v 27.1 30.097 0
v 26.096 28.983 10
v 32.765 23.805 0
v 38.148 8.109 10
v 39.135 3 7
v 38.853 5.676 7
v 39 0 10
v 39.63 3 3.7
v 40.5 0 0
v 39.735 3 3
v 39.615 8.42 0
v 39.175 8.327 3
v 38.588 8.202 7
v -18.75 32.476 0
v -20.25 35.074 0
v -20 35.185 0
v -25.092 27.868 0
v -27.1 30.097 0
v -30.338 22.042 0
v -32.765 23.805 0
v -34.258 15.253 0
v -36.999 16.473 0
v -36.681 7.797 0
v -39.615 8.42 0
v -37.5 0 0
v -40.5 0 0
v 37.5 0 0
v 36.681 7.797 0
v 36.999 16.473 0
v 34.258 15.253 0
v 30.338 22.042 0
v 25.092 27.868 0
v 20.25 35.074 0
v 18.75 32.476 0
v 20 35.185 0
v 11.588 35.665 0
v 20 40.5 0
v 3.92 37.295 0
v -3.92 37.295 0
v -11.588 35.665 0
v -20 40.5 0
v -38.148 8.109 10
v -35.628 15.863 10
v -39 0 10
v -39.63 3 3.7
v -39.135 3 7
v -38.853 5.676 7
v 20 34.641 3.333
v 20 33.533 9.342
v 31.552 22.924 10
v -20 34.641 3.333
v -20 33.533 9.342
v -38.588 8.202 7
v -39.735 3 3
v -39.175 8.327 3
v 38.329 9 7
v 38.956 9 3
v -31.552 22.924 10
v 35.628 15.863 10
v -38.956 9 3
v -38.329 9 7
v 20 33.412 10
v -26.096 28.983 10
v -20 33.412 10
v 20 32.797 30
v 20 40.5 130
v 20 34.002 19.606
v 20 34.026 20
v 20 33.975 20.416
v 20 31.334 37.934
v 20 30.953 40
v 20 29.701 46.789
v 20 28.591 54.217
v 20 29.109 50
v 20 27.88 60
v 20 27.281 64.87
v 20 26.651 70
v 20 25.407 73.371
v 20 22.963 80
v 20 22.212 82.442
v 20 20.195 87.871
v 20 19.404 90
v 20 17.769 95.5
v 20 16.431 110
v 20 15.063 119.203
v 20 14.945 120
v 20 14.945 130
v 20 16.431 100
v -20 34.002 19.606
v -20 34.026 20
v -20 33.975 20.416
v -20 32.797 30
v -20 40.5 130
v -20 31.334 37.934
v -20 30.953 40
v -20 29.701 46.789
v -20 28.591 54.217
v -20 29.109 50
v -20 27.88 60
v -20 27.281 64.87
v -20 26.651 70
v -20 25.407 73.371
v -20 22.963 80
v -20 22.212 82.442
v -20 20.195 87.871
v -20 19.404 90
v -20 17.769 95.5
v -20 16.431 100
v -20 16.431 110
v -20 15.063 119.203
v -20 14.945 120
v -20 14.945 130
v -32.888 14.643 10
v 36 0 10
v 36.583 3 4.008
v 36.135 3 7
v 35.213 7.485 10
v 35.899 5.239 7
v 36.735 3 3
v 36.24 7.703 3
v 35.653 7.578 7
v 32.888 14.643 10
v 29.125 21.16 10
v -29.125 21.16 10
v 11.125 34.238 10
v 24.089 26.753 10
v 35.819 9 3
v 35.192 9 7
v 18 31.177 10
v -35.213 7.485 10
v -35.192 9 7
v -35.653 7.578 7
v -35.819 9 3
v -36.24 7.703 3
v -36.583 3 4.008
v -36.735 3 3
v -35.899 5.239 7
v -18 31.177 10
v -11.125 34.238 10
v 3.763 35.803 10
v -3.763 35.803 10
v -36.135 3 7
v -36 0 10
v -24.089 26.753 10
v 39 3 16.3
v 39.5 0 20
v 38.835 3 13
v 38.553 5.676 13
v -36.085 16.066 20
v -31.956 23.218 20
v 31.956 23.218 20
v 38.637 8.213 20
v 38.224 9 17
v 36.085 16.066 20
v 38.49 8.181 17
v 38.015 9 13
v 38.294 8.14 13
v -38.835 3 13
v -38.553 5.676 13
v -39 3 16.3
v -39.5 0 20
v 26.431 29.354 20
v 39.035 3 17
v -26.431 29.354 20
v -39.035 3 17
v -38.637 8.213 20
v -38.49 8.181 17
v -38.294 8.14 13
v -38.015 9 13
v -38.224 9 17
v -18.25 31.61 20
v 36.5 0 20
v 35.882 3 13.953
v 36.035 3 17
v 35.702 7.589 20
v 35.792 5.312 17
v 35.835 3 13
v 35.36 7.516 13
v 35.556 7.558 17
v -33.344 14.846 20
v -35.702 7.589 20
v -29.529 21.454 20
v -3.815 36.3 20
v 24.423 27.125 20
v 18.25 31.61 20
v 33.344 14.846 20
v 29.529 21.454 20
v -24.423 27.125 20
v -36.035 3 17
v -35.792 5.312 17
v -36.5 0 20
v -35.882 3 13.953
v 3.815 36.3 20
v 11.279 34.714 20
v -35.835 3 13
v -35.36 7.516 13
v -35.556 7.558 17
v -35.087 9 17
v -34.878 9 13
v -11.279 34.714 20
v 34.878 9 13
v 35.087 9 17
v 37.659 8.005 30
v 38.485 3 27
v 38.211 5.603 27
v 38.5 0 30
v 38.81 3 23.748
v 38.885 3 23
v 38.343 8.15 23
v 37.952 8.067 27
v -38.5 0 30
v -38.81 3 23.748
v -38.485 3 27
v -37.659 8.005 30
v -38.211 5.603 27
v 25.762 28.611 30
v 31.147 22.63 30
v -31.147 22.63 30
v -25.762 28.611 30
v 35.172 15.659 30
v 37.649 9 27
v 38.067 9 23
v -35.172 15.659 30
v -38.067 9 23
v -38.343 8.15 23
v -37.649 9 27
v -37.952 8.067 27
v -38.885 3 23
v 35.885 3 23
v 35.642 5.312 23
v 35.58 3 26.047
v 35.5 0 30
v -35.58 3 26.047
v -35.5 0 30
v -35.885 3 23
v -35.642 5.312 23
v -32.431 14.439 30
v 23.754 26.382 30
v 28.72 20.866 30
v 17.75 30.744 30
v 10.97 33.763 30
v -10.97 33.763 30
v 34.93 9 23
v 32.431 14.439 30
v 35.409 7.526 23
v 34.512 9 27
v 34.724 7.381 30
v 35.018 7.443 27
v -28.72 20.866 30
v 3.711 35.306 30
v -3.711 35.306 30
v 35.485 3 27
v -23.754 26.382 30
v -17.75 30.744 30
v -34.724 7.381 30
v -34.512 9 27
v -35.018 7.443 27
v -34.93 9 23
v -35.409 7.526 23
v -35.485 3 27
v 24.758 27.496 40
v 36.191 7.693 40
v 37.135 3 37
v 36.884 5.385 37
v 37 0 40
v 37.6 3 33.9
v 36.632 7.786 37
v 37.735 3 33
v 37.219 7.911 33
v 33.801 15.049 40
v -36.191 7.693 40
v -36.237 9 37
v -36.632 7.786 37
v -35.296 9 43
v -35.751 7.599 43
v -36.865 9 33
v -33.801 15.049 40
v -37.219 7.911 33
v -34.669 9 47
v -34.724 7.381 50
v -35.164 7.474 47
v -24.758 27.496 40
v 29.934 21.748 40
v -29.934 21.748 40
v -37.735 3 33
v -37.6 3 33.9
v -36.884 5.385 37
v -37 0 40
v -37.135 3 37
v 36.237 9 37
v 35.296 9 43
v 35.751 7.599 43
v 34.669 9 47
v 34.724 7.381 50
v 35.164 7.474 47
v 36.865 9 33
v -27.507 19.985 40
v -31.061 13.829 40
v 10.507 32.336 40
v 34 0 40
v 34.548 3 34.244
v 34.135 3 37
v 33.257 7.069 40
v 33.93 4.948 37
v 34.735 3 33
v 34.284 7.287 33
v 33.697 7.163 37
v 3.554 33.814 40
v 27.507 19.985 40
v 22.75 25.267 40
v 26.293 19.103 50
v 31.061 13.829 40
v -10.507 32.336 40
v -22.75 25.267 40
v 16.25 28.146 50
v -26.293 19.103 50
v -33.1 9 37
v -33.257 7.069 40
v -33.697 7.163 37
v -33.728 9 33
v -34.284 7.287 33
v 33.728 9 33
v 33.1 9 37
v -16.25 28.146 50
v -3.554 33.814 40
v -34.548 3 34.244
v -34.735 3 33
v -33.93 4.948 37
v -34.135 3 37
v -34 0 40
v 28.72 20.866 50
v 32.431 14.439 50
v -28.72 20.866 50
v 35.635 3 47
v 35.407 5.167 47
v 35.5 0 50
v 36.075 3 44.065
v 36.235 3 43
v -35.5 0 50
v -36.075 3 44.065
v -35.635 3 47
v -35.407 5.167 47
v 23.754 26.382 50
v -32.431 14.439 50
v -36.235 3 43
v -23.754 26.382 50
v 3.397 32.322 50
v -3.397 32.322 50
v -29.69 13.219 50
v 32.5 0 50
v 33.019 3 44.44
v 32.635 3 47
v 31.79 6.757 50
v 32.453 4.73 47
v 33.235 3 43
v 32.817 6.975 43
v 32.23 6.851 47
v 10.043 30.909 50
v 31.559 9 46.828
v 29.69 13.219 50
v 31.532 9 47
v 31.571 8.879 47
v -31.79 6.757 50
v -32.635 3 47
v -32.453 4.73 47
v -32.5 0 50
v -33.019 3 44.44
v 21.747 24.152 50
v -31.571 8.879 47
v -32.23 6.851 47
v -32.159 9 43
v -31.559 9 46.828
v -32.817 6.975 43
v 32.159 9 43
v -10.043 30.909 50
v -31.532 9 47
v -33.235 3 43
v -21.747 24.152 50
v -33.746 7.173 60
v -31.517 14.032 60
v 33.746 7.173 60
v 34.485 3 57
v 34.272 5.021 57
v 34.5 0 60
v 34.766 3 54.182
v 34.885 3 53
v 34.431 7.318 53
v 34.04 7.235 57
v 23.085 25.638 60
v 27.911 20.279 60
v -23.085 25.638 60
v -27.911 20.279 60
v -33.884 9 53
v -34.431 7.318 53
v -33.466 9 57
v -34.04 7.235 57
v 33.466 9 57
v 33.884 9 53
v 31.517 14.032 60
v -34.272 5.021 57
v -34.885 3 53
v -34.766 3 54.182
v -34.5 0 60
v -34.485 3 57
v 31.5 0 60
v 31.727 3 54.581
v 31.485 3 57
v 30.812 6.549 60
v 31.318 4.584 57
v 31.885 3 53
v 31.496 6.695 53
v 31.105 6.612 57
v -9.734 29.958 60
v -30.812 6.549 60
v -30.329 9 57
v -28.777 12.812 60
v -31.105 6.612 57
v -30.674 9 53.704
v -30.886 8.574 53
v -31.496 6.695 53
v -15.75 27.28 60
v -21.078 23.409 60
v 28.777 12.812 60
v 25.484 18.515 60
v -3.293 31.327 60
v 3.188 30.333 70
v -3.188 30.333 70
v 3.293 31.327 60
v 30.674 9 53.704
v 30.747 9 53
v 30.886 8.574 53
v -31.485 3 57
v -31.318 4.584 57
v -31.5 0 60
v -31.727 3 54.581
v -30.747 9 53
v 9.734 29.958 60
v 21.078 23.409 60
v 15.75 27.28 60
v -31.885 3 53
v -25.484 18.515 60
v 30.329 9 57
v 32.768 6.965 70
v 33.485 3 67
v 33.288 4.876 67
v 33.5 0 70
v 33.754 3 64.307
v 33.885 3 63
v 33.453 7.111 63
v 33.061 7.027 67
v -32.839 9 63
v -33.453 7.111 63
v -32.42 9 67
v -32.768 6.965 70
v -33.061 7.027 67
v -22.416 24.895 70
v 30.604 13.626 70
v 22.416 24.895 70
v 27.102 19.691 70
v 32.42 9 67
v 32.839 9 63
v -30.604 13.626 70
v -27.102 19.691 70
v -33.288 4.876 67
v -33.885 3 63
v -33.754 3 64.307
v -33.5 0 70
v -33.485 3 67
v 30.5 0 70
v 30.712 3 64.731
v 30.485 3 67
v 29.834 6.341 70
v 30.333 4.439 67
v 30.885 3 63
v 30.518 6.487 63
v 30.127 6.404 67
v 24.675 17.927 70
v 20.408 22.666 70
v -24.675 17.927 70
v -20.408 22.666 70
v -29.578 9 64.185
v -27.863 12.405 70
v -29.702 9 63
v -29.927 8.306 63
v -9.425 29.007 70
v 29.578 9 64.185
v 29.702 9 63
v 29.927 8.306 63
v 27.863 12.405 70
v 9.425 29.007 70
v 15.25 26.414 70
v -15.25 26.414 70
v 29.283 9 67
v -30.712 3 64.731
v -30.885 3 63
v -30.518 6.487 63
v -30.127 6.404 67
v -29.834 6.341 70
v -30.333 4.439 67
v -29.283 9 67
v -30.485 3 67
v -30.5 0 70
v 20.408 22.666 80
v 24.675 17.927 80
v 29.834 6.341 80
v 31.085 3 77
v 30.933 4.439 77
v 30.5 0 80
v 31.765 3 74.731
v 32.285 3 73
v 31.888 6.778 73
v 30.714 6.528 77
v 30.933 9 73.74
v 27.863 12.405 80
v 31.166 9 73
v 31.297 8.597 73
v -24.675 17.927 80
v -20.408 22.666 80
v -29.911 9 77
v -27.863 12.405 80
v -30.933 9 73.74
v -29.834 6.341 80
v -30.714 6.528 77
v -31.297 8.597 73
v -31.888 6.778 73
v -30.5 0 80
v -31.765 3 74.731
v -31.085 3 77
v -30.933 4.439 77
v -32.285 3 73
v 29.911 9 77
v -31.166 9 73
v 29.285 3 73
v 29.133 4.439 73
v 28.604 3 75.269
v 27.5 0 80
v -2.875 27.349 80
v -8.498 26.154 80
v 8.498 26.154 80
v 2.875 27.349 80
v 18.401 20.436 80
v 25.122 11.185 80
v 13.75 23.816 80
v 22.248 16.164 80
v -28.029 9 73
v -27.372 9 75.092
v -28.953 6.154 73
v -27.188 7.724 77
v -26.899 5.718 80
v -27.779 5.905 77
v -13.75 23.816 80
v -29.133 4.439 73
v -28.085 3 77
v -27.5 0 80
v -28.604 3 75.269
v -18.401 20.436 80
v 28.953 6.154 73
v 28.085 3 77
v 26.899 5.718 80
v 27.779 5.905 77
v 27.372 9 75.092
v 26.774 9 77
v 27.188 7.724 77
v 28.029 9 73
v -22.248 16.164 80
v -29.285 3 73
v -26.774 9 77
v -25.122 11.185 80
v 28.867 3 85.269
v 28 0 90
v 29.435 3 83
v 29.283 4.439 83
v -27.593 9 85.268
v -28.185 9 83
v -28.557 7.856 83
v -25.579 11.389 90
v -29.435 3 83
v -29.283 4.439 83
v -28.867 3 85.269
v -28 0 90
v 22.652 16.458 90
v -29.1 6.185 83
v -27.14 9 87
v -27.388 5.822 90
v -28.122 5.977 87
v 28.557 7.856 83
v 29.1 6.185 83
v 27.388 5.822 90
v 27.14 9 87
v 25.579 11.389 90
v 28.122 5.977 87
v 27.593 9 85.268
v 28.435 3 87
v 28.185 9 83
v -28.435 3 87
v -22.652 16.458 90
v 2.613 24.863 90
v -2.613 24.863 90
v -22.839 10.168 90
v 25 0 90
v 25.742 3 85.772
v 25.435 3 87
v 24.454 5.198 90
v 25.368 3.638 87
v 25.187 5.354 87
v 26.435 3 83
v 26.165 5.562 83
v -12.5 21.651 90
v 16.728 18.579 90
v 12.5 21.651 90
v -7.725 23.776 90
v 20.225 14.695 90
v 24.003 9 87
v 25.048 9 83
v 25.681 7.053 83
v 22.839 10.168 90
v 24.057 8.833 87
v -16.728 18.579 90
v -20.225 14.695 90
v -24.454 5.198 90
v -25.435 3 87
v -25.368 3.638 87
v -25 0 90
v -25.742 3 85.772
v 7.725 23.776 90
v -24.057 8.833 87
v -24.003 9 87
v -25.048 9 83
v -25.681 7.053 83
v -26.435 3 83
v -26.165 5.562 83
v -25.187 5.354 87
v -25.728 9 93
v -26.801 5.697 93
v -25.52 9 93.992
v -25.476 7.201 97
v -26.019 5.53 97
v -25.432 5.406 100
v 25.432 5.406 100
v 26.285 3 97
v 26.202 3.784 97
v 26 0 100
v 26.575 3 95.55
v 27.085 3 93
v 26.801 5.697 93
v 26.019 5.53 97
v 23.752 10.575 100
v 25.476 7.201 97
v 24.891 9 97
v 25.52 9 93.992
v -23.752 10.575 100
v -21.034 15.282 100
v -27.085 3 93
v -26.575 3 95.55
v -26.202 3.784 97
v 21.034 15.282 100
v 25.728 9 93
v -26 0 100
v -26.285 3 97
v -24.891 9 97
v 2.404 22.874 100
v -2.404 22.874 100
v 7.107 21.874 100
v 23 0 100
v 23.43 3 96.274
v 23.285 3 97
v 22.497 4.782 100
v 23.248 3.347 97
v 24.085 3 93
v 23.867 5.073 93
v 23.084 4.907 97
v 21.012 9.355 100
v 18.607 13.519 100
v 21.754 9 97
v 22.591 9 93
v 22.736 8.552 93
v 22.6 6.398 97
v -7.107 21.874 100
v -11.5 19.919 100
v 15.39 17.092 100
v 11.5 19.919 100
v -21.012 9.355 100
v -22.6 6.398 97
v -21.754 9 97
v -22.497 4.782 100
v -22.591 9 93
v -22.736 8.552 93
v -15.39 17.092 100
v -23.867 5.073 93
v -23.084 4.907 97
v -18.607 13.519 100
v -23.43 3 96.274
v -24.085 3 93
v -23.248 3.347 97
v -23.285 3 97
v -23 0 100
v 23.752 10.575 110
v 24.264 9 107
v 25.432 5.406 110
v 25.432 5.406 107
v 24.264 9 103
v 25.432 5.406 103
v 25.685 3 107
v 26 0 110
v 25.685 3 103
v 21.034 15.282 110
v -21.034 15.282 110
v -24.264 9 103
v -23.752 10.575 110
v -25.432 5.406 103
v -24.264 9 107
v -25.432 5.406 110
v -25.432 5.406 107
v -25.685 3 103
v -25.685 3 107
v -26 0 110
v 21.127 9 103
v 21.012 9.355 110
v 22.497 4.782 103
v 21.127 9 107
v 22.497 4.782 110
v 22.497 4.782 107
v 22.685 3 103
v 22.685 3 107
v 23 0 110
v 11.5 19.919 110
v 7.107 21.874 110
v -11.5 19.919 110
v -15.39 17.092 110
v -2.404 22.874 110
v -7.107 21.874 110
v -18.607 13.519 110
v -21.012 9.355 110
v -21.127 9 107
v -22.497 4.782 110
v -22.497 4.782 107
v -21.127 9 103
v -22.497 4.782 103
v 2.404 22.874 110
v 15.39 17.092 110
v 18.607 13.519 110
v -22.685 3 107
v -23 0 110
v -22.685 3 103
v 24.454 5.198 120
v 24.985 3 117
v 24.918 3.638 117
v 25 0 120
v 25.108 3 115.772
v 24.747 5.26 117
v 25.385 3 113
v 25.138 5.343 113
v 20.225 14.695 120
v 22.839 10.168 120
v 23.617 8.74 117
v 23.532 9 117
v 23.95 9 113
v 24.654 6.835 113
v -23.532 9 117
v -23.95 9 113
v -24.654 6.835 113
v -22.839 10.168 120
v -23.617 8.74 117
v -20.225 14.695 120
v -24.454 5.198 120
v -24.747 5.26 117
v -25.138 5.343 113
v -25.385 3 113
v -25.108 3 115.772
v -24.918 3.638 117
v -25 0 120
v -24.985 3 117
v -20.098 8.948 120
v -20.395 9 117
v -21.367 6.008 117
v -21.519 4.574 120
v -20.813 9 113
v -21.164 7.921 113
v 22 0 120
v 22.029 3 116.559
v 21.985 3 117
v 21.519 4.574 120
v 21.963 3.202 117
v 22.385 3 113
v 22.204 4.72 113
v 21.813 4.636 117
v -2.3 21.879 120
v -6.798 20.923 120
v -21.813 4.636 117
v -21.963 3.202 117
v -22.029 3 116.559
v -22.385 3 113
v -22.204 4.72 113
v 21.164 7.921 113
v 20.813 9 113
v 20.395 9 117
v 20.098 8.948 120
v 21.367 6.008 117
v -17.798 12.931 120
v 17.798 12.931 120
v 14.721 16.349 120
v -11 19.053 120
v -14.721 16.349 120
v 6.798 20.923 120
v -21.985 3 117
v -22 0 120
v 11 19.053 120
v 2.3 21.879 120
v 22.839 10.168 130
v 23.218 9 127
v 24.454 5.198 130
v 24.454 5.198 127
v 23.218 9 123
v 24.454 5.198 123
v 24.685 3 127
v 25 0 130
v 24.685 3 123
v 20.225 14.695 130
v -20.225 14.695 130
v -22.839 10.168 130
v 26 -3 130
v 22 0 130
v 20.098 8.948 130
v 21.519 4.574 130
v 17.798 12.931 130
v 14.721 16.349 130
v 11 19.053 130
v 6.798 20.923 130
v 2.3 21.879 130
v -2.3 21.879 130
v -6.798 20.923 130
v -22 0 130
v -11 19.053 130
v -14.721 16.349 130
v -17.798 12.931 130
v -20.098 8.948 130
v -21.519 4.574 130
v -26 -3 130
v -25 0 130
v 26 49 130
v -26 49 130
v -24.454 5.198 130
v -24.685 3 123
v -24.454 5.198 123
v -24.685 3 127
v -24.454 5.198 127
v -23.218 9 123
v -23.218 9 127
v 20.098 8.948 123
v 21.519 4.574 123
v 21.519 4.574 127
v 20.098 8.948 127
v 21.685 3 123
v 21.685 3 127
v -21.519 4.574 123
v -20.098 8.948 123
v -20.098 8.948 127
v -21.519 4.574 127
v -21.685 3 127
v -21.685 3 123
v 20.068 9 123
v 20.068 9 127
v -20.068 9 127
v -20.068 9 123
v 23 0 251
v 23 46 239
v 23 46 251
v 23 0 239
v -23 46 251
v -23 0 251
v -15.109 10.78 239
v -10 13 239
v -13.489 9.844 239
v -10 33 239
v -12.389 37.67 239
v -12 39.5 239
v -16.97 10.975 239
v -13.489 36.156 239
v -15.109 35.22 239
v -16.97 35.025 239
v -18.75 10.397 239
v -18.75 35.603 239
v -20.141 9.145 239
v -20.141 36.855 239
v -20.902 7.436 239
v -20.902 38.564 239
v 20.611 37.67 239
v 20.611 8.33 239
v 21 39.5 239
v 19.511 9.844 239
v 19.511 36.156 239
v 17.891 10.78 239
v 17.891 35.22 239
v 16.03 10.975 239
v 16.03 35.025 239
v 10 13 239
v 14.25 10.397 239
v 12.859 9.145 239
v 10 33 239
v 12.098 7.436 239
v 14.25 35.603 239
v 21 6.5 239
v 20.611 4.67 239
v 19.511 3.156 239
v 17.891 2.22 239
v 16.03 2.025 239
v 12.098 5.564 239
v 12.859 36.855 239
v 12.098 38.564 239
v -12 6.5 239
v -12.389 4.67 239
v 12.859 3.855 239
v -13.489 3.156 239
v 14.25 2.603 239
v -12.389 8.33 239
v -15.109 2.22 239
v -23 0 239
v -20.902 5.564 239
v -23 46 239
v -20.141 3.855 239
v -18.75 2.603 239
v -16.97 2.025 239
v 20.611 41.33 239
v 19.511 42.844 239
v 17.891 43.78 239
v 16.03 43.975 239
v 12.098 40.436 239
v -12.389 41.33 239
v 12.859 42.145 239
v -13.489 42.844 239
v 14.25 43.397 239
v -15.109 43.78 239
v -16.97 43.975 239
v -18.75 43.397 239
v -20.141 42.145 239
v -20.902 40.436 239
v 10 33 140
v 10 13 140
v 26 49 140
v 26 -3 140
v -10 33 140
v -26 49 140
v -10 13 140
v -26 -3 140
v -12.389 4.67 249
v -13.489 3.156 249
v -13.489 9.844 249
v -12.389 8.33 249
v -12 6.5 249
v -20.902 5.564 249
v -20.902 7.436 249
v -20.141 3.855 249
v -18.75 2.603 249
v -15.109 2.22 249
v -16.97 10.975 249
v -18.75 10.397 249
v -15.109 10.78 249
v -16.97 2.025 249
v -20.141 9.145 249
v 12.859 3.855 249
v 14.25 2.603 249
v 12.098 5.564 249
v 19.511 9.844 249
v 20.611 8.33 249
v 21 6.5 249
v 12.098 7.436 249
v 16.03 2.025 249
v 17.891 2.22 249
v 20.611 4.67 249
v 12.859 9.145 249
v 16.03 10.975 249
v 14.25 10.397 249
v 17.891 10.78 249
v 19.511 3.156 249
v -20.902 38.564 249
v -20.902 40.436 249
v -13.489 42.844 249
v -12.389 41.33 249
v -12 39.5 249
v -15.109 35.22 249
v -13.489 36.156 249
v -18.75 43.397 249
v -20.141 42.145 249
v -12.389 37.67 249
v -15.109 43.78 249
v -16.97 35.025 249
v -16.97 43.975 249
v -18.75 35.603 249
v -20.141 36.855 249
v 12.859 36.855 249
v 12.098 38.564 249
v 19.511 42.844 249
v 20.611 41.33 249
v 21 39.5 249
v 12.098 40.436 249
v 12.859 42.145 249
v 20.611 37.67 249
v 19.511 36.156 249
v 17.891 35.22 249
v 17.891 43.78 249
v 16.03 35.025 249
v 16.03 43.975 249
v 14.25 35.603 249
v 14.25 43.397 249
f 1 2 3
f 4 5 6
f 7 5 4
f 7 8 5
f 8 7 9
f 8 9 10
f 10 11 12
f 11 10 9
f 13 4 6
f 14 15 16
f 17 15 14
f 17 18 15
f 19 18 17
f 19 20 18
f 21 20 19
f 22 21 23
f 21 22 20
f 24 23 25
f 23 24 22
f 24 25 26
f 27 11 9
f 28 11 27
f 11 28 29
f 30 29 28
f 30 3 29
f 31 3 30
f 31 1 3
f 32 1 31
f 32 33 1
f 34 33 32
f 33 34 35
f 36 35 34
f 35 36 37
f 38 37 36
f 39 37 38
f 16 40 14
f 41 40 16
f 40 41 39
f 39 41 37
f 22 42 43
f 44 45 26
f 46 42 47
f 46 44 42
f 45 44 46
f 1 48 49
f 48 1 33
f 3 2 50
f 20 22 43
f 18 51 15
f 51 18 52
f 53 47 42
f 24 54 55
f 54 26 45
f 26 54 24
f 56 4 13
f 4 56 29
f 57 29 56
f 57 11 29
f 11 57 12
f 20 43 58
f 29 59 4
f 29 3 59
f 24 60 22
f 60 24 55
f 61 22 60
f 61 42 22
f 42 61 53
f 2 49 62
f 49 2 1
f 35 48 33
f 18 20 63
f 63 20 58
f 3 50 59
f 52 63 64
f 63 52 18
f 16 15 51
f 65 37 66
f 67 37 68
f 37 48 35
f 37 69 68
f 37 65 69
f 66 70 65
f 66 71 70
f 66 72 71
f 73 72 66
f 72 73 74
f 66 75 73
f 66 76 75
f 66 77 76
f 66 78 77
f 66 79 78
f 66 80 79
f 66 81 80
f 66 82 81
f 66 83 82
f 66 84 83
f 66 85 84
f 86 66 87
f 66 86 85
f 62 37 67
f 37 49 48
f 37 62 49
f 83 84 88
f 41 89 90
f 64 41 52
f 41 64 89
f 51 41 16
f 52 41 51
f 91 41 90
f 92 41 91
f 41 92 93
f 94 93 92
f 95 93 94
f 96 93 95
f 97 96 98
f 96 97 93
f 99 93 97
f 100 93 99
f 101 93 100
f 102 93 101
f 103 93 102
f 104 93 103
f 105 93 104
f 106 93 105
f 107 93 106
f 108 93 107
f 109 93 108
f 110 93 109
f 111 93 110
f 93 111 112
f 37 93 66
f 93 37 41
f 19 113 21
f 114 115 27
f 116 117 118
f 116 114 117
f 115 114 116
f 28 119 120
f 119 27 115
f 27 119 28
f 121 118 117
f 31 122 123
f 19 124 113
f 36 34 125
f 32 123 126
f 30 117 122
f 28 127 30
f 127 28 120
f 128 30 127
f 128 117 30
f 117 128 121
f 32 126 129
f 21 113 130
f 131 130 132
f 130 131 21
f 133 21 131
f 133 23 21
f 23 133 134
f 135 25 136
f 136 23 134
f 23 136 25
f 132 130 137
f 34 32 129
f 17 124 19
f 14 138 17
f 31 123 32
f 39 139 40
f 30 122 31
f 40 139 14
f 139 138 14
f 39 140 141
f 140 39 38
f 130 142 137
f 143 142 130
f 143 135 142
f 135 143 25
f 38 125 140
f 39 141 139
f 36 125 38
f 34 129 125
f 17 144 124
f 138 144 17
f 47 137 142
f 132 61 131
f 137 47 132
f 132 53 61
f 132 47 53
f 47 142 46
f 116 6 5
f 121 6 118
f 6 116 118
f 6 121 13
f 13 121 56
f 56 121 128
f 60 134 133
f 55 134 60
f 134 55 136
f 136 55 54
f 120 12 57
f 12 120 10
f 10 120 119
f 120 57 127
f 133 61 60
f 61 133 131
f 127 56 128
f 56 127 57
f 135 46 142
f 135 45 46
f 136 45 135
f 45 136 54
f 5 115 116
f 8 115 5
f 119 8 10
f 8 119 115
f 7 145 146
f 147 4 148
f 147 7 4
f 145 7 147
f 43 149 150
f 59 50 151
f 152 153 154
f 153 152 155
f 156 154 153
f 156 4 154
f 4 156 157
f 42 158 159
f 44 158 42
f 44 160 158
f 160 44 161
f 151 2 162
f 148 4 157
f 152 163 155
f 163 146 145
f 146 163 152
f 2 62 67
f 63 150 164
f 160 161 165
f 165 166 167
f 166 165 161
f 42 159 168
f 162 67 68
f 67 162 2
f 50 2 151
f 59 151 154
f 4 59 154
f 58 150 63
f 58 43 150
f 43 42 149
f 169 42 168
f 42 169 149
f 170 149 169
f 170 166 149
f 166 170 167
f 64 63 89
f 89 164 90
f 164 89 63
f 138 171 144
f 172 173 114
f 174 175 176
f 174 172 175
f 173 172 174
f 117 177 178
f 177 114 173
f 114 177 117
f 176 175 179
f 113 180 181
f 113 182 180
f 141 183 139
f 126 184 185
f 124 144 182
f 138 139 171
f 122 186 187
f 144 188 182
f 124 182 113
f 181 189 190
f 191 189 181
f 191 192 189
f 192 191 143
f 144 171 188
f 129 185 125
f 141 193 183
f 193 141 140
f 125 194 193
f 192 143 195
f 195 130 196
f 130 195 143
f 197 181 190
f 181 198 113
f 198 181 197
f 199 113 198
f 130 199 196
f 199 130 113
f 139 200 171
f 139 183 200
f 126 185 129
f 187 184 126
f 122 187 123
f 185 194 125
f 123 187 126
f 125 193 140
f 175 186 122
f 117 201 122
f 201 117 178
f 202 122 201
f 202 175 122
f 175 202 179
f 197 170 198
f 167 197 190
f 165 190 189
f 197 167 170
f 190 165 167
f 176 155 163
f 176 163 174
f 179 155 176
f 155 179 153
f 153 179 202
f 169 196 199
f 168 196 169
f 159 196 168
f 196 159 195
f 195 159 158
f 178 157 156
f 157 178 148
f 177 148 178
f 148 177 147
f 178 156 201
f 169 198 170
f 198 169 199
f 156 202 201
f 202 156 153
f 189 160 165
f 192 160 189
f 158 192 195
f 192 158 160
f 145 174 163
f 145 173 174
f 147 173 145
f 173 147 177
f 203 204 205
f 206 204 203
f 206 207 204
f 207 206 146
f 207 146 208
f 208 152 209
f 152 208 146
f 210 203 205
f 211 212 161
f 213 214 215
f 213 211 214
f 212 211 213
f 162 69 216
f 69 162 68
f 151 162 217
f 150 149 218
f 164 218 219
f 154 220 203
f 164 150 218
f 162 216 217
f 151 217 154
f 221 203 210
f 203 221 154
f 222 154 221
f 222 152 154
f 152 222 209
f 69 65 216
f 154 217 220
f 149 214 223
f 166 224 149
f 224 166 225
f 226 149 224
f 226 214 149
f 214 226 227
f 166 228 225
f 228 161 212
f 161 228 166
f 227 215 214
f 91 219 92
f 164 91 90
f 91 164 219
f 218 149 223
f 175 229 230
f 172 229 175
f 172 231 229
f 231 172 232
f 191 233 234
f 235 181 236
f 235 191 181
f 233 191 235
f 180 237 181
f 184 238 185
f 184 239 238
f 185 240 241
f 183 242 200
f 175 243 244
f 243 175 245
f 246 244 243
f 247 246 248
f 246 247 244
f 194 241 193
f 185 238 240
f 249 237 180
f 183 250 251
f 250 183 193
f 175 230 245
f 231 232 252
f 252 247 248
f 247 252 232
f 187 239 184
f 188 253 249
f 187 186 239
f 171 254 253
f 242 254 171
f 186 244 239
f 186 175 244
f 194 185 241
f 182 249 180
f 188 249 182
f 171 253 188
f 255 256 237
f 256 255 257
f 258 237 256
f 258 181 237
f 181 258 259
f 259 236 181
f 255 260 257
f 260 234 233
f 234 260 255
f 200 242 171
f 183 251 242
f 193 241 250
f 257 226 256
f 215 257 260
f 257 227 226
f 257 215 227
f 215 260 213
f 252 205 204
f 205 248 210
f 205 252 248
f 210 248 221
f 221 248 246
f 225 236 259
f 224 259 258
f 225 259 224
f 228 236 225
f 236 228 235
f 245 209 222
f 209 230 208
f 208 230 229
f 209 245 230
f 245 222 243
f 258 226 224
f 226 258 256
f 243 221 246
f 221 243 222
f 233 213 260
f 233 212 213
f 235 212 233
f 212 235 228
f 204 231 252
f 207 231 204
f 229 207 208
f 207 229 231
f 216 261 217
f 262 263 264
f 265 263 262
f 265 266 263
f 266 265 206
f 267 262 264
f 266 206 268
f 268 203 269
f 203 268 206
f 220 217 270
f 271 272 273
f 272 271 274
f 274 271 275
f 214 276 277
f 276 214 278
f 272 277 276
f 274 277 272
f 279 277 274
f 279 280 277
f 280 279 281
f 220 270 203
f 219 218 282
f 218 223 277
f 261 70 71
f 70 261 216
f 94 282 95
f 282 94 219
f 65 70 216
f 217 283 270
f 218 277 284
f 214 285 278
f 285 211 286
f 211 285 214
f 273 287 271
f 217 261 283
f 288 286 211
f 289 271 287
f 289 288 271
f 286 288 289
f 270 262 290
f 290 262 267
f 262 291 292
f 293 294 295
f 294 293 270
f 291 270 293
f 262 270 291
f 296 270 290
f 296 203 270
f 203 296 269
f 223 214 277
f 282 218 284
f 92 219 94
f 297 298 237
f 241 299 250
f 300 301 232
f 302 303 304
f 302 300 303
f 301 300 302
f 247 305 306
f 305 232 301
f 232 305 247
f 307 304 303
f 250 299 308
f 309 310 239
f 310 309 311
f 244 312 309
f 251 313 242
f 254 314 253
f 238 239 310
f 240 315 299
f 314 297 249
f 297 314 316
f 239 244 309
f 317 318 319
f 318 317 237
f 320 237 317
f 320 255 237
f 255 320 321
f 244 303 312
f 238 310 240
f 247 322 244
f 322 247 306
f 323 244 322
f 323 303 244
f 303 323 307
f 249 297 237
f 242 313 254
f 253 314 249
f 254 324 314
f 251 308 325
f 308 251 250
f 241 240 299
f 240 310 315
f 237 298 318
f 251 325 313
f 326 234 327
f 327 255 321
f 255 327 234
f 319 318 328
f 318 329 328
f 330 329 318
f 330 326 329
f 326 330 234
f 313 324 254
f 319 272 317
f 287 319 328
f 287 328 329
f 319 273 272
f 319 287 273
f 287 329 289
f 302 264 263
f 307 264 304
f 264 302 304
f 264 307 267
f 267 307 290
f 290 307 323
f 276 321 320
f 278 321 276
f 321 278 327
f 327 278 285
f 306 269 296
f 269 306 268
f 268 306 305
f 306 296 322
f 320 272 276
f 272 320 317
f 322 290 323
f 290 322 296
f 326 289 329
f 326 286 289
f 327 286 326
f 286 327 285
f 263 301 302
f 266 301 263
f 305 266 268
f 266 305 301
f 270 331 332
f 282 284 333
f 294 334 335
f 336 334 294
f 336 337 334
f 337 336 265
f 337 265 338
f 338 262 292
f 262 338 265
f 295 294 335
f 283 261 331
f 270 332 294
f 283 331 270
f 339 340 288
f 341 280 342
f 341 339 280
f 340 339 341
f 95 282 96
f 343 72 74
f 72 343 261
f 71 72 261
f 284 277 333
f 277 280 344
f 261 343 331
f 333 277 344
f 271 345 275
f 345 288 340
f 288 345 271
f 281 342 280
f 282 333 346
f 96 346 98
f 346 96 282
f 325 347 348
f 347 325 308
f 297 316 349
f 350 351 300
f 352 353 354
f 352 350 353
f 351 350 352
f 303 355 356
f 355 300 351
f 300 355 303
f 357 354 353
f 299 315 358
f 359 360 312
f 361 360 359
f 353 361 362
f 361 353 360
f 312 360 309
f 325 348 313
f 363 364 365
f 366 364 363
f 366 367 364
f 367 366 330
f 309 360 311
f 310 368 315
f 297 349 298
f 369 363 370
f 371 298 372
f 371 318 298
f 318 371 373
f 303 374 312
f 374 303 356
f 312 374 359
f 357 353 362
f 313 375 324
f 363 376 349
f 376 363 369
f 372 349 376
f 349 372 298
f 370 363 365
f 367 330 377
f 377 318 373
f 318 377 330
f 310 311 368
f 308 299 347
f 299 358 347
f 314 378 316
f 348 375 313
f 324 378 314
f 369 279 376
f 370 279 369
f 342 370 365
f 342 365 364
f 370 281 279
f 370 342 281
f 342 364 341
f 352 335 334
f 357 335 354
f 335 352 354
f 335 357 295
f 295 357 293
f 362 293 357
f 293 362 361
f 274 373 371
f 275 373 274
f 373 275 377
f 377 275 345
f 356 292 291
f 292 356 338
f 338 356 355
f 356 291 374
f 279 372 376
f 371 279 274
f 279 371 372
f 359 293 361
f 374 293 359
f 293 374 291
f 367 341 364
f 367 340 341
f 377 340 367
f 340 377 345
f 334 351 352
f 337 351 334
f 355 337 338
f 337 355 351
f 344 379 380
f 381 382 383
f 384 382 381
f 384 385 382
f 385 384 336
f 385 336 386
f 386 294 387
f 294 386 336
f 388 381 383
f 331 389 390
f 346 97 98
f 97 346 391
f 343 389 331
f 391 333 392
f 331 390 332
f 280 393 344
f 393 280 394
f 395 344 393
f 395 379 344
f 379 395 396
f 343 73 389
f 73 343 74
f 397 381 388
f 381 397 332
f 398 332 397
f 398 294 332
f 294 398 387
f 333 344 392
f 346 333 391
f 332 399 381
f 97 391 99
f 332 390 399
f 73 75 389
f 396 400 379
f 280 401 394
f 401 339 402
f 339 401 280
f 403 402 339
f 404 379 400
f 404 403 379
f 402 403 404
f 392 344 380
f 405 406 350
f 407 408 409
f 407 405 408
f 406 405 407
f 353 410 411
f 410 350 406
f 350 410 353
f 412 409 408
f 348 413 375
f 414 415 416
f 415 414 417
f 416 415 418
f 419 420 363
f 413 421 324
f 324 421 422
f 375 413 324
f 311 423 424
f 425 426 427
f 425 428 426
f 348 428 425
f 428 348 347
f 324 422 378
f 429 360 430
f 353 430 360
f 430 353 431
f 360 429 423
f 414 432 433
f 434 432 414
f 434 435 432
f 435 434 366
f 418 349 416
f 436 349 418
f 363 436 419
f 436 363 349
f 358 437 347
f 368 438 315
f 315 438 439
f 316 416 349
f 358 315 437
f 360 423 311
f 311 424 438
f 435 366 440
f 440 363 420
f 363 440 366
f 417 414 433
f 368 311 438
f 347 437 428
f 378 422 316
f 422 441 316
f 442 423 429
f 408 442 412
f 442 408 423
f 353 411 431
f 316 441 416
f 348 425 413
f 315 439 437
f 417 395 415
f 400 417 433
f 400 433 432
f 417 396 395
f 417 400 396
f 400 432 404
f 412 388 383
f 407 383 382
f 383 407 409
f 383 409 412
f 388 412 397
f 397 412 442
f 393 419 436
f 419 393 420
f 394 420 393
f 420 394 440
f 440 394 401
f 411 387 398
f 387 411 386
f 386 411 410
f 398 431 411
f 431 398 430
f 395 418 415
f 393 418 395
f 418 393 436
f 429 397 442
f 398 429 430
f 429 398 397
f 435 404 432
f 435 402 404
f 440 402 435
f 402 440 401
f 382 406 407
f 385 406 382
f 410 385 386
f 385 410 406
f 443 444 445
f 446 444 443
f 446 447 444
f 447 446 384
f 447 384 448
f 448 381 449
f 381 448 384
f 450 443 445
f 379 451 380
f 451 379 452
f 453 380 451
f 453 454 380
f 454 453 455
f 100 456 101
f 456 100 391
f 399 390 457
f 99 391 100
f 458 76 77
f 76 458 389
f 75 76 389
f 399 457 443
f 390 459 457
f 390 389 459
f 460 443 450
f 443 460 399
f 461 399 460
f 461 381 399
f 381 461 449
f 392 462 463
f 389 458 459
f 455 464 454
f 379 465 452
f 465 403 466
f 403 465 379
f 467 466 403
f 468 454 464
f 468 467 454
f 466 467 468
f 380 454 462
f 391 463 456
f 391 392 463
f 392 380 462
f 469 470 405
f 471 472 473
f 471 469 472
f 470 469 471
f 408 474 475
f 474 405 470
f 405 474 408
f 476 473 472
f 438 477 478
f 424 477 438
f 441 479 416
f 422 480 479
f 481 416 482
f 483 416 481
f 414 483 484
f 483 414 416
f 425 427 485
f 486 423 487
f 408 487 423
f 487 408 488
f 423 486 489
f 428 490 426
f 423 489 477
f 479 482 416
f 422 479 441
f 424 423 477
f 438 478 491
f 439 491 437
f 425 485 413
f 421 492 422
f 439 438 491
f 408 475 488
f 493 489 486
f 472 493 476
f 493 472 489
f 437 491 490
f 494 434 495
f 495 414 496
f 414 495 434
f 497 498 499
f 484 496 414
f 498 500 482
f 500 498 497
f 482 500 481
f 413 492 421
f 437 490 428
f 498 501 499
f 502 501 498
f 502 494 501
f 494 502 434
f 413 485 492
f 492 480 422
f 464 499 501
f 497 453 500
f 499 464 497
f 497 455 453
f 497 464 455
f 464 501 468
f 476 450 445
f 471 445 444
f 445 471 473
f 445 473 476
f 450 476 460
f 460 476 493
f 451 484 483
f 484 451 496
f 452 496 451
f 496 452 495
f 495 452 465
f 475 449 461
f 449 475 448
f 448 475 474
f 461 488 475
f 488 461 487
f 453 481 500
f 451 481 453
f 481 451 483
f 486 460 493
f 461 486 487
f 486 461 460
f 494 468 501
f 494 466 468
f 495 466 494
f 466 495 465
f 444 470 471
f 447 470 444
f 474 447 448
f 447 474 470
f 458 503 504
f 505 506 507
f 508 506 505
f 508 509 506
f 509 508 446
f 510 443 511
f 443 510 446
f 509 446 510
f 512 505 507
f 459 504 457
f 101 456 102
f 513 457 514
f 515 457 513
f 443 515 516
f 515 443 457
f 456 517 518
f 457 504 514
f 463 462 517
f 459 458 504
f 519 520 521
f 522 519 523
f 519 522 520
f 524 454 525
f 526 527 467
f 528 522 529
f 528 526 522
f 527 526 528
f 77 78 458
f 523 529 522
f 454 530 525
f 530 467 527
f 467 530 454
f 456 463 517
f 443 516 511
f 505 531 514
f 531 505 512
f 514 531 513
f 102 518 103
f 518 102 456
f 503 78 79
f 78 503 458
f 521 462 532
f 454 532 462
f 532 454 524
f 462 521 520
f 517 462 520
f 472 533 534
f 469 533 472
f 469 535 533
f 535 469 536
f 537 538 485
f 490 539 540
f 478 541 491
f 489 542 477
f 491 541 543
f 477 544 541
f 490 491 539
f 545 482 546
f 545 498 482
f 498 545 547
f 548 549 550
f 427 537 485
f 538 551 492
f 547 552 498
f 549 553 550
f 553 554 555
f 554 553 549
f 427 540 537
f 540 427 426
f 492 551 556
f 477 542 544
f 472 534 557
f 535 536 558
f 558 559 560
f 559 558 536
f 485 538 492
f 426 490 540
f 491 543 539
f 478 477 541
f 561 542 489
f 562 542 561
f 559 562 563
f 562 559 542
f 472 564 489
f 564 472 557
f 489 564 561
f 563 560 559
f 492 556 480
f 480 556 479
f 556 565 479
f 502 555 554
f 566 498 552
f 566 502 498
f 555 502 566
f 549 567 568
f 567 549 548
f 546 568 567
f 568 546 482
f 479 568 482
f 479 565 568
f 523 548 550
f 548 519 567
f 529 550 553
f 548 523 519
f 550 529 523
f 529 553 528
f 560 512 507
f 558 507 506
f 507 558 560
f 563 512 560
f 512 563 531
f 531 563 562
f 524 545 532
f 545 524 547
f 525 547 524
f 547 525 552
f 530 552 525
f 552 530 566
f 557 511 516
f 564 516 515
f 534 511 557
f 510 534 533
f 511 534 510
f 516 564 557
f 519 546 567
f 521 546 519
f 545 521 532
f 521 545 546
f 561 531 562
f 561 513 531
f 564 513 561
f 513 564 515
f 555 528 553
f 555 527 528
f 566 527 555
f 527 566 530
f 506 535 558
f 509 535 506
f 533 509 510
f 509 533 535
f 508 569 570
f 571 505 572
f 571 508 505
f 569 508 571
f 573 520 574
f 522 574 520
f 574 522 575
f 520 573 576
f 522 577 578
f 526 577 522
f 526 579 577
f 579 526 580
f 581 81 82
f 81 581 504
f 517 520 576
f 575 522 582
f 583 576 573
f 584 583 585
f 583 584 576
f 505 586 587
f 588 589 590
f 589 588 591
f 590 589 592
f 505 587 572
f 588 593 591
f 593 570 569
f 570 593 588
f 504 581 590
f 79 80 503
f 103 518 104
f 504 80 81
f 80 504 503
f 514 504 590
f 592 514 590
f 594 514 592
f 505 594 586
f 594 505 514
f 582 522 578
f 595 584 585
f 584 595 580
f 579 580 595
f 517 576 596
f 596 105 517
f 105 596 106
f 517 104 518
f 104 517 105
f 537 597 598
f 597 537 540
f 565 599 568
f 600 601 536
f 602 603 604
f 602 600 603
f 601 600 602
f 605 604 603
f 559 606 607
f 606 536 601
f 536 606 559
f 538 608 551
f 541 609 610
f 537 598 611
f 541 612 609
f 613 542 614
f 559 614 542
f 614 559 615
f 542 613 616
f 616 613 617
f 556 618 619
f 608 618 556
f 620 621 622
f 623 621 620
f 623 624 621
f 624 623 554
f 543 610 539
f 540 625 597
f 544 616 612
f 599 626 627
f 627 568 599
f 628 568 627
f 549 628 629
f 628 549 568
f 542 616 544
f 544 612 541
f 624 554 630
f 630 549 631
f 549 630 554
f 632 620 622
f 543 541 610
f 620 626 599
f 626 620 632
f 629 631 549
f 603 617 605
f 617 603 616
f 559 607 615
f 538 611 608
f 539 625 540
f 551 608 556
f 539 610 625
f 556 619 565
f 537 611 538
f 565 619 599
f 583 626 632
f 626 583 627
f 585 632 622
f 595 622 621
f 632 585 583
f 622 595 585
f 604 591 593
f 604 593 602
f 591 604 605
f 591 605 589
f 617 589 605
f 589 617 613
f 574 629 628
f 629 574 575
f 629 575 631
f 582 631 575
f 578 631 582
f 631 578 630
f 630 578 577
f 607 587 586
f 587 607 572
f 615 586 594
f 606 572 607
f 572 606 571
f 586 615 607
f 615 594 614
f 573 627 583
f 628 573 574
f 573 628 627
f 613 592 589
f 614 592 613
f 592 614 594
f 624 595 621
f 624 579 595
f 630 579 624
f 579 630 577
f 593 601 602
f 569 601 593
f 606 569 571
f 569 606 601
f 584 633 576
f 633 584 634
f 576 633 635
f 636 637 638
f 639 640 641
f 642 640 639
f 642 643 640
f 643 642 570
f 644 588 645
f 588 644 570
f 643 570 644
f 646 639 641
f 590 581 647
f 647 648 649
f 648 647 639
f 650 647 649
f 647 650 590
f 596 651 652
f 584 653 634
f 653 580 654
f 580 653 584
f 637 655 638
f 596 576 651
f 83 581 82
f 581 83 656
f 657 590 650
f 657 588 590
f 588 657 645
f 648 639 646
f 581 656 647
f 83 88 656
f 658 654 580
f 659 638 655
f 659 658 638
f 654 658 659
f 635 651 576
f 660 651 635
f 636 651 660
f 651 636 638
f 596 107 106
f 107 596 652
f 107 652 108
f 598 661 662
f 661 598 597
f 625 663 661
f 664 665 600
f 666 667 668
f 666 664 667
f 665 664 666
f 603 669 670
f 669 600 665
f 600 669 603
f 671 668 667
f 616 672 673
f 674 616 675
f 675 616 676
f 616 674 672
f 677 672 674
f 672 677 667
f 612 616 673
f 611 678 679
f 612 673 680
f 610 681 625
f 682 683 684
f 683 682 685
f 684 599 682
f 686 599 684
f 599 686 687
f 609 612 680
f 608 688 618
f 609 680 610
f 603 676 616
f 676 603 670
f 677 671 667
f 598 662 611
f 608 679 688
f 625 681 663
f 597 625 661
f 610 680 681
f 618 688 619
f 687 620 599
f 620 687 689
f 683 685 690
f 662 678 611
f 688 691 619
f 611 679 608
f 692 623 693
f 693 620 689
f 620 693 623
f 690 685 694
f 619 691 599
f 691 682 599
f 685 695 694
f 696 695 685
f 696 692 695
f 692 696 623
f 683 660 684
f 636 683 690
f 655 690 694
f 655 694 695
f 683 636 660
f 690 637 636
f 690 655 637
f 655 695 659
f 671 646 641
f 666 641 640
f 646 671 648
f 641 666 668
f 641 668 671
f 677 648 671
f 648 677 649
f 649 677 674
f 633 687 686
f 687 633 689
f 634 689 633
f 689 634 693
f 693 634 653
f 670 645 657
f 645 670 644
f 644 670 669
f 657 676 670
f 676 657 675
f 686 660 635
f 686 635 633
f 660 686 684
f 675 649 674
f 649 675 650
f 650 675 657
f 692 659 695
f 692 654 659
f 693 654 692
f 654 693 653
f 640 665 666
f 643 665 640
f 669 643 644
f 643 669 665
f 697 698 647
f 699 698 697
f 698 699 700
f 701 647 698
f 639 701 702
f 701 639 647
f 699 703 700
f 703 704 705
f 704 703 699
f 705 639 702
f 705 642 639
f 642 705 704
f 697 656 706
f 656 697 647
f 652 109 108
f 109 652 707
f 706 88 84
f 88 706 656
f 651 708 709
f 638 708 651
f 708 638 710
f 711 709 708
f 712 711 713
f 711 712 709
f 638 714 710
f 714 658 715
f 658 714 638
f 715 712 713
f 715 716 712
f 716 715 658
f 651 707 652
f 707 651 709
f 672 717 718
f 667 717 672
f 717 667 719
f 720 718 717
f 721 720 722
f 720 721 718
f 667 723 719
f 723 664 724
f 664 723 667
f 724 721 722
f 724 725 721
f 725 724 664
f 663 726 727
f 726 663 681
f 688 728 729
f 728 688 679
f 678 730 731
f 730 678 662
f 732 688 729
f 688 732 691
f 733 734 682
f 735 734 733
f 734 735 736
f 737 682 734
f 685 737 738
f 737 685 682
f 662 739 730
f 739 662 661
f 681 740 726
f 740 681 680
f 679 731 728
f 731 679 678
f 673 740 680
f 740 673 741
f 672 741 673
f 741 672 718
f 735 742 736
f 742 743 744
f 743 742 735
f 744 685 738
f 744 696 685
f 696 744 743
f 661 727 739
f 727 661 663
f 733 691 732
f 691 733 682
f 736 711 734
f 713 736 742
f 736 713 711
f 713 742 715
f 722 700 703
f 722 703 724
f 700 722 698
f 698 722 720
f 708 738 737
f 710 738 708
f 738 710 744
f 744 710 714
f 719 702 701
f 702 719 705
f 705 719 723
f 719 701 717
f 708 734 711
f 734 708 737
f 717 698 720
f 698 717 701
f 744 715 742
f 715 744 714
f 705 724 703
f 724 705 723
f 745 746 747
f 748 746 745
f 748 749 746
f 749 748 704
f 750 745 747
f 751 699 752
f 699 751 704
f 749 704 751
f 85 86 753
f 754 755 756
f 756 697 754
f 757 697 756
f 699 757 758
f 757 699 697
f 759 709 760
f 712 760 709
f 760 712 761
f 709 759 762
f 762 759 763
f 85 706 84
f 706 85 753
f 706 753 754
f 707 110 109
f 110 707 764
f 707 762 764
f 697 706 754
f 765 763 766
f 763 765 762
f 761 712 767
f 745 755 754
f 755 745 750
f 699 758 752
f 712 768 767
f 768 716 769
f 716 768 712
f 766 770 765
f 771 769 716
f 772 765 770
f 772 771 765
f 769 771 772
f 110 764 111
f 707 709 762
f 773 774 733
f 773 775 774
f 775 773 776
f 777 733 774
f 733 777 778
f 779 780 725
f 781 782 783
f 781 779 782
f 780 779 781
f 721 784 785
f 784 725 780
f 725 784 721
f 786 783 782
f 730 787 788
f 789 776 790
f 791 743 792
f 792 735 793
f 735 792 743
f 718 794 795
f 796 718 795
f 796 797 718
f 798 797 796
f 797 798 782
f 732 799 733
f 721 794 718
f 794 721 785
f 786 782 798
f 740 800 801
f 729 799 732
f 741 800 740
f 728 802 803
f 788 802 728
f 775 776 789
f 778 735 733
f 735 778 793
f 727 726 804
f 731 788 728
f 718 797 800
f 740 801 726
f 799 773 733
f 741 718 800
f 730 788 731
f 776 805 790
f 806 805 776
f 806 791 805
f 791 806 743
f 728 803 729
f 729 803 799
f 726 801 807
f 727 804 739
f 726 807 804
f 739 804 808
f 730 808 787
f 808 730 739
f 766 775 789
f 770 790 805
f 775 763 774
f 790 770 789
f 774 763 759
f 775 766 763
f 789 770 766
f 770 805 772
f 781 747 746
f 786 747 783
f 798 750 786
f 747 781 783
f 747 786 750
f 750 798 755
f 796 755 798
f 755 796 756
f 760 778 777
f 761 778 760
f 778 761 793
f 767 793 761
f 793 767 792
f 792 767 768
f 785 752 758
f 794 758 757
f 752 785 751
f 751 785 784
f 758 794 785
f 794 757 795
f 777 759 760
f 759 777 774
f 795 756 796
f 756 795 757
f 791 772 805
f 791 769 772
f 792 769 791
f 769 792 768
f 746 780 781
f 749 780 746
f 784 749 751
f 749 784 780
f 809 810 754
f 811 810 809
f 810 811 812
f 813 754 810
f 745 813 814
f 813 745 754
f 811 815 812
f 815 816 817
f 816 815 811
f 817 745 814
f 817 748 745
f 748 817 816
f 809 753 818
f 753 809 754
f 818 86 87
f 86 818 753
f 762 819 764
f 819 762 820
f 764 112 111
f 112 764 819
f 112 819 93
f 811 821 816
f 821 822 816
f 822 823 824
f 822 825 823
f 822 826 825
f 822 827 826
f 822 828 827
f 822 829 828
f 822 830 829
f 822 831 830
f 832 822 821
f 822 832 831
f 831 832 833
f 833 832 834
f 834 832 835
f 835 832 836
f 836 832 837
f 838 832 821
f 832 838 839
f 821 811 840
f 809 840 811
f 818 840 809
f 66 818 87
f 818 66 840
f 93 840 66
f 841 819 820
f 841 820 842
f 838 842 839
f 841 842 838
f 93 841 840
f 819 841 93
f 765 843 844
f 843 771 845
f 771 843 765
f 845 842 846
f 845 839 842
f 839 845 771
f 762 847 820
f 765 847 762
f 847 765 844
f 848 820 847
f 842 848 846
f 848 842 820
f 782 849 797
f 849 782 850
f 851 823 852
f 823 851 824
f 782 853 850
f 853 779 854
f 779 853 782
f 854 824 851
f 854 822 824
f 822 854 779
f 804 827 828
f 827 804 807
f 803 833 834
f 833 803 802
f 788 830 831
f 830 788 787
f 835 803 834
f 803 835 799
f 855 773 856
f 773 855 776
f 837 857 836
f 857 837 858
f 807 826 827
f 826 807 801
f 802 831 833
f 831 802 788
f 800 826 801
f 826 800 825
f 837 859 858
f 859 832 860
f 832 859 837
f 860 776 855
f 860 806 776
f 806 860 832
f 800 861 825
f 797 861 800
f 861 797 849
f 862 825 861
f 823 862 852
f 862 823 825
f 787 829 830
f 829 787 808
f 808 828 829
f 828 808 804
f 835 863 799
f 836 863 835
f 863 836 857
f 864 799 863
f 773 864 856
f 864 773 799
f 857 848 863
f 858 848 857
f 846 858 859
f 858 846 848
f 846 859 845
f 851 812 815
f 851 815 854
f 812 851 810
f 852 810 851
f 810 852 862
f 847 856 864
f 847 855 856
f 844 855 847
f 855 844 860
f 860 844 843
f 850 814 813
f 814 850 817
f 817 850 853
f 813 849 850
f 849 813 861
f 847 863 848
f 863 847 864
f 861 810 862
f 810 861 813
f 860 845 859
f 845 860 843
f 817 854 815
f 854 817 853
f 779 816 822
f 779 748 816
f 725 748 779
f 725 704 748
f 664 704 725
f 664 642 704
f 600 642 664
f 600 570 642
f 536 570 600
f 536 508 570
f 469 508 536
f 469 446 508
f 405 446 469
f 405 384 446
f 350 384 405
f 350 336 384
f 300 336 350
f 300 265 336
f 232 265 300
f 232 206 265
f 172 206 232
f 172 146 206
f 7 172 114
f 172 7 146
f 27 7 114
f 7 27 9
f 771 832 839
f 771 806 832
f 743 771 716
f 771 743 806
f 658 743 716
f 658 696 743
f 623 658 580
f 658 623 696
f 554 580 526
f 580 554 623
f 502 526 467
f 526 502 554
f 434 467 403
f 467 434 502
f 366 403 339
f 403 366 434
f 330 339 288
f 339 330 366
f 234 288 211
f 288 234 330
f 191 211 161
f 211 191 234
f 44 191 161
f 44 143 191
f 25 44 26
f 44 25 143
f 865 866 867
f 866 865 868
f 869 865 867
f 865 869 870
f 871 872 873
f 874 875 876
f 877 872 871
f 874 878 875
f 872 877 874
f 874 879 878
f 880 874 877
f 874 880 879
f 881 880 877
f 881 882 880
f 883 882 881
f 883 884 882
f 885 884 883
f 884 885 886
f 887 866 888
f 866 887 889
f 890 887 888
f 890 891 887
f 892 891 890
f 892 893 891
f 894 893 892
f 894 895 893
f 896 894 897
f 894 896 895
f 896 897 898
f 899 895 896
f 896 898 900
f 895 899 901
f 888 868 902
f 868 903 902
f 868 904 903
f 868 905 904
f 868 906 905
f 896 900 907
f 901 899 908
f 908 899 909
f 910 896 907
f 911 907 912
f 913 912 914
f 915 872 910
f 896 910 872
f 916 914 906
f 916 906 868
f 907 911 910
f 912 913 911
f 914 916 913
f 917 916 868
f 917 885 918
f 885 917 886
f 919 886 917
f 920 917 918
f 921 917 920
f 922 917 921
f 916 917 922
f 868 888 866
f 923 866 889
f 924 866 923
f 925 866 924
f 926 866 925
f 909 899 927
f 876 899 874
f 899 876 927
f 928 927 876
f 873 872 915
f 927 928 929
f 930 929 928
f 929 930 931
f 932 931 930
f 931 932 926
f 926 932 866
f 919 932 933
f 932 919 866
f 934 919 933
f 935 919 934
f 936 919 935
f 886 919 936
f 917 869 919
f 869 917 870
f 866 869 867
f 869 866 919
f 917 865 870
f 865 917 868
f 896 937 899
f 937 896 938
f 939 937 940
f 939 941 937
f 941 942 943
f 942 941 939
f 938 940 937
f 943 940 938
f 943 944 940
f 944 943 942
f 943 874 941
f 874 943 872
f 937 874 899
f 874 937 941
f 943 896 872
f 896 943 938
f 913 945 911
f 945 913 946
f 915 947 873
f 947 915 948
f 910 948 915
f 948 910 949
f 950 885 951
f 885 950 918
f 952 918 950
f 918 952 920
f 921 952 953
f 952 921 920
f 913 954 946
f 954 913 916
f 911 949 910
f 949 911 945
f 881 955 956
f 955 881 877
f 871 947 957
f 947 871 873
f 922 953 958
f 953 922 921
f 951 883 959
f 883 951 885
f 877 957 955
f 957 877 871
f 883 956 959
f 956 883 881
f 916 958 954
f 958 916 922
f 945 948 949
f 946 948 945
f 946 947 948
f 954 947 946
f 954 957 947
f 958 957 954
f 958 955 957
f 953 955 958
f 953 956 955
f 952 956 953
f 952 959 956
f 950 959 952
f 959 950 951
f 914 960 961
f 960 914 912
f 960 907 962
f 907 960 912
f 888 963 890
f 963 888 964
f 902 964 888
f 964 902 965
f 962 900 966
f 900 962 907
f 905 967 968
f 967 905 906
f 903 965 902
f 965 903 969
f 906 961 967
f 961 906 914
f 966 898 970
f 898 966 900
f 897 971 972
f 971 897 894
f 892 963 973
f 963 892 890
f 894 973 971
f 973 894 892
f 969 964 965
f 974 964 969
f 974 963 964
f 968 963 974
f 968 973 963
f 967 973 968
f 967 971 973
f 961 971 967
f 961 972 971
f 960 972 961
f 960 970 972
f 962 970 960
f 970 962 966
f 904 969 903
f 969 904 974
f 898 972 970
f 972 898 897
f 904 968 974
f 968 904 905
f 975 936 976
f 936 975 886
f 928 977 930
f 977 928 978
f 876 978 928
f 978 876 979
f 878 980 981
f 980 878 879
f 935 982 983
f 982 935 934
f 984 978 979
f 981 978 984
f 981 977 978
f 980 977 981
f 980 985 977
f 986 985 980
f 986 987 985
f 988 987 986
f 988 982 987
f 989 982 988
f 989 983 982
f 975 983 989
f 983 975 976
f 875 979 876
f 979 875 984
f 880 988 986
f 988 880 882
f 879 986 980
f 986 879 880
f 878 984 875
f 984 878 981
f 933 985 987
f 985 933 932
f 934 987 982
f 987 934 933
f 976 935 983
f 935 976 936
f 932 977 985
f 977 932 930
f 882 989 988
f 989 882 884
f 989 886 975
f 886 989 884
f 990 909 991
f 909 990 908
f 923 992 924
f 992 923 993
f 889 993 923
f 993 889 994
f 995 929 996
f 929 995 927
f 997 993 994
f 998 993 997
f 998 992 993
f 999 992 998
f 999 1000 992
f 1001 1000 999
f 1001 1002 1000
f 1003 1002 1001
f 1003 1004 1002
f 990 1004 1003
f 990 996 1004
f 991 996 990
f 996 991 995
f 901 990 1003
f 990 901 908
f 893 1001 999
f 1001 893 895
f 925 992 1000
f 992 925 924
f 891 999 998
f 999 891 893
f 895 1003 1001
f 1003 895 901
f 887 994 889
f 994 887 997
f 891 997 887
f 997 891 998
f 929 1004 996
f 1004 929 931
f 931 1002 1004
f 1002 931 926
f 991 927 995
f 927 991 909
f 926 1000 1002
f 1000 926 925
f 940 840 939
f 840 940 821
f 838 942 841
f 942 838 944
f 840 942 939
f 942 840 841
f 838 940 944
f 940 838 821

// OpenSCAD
union()  {
difference()  {
union()  {
translate([0.0,0.0,0.0])difference()  {
union()  {
cylinder(r1=40.5,r2=39.0,h=10.0);
translate([-20.0,0.0,0.0])cube([40.0,40.5,10.0]);
}
cylinder(r1=37.5,r2=36.0,h=10.0);
translate([-40.5,3.0,3.0])cube([81.0,6.0,4.0]);
}
translate([0.0,0.0,10.0])difference()  {
union()  {
cylinder(r1=39.0,r2=39.5,h=10.0);
translate([-20.0,0.0,0.0])cube([40.0,40.5,10.0]);
}
cylinder(r1=36.0,r2=36.5,h=10.0);
translate([-40.5,3.0,3.0])cube([81.0,6.0,4.0]);
}
translate([0.0,0.0,20.0])difference()  {
union()  {
cylinder(r1=39.5,r2=38.5,h=10.0);
translate([-20.0,0.0,0.0])cube([40.0,40.5,10.0]);
}
cylinder(r1=36.5,r2=35.5,h=10.0);
translate([-40.5,3.0,3.0])cube([81.0,6.0,4.0]);
}
translate([0.0,0.0,30.0])difference()  {
union()  {
cylinder(r1=38.5,r2=37.0,h=10.0);
translate([-20.0,0.0,0.0])cube([40.0,40.5,10.0]);
}
cylinder(r1=35.5,r2=34.0,h=10.0);
translate([-40.5,3.0,3.0])cube([81.0,6.0,4.0]);
}
translate([0.0,0.0,40.0])difference()  {
union()  {
cylinder(r1=37.0,r2=35.5,h=10.0);
translate([-20.0,0.0,0.0])cube([40.0,40.5,10.0]);
}
cylinder(r1=34.0,r2=32.5,h=10.0);
translate([-40.5,3.0,3.0])cube([81.0,6.0,4.0]);
}
translate([0.0,0.0,50.0])difference()  {
union()  {
cylinder(r1=35.5,r2=34.5,h=10.0);
translate([-20.0,0.0,0.0])cube([40.0,40.5,10.0]);
}
cylinder(r1=32.5,r2=31.5,h=10.0);
translate([-40.5,3.0,3.0])cube([81.0,6.0,4.0]);
}
translate([0.0,0.0,60.0])difference()  {
union()  {
cylinder(r1=34.5,r2=33.5,h=10.0);
translate([-20.0,0.0,0.0])cube([40.0,40.5,10.0]);
}
cylinder(r1=31.5,r2=30.5,h=10.0);
translate([-40.5,3.0,3.0])cube([81.0,6.0,4.0]);
}
translate([0.0,0.0,70.0])difference()  {
union()  {
cylinder(r1=33.5,r2=30.5,h=10.0);
translate([-20.0,0.0,0.0])cube([40.0,40.5,10.0]);
}
cylinder(r1=30.5,r2=27.5,h=10.0);
translate([-40.5,3.0,3.0])cube([81.0,6.0,4.0]);
}
translate([0.0,0.0,80.0])difference()  {
union()  {
cylinder(r1=30.5,r2=28.0,h=10.0);
translate([-20.0,0.0,0.0])cube([40.0,40.5,10.0]);
}
cylinder(r1=27.5,r2=25.0,h=10.0);
translate([-40.5,3.0,3.0])cube([81.0,6.0,4.0]);
}
translate([0.0,0.0,90.0])difference()  {
union()  {
cylinder(r1=28.0,r2=26.0,h=10.0);
translate([-20.0,0.0,0.0])cube([40.0,40.5,10.0]);
}
cylinder(r1=25.0,r2=23.0,h=10.0);
translate([-40.5,3.0,3.0])cube([81.0,6.0,4.0]);
}
translate([0.0,0.0,100.0])difference()  {
union()  {
cylinder(r1=26.0,r2=26.0,h=10.0);
translate([-20.0,0.0,0.0])cube([40.0,40.5,10.0]);
}
cylinder(r1=23.0,r2=23.0,h=10.0);
translate([-40.5,3.0,3.0])cube([81.0,6.0,4.0]);
}
translate([0.0,0.0,110.0])difference()  {
union()  {
cylinder(r1=26.0,r2=25.0,h=10.0);
translate([-20.0,0.0,0.0])cube([40.0,40.5,10.0]);
}
cylinder(r1=23.0,r2=22.0,h=10.0);
translate([-40.5,3.0,3.0])cube([81.0,6.0,4.0]);
}
translate([0.0,0.0,120.0])difference()  {
union()  {
cylinder(r1=25.0,r2=25.0,h=10.0);
translate([-20.0,0.0,0.0])cube([40.0,40.5,10.0]);
}
cylinder(r1=22.0,r2=22.0,h=10.0);
translate([-40.5,3.0,3.0])cube([81.0,6.0,4.0]);
}
}
translate([-40.5,-40.5,0.0])cube([81.0,40.5,140.0]);
}
translate([0.0,23.0,140.0])scale([1.0,1.0,1.0])rotate([0.0,0.0,0.0])  union()  {
translate([0.0,0.0,24.0])scale([1.0,1.0,1.0])rotate([0.0,0.0,0.0])  difference()  {
union()  {
translate([0.0,0.0,75.0])translate([-23.0,-23.0,0.0])cube([46.0,46.0,12.0]);
translate([0.0,0.0,-24.0])translate([-10.0,-10.0,0.0])cube([20.0,20.0,99.0]);
}
translate([0.0,0.0,75.0])  {
translate([-16.5,-16.5,0.0])cylinder(r=4.5,h=10.0);
translate([16.5,-16.5,0.0])cylinder(r=4.5,h=10.0);
translate([-16.5,16.5,0.0])cylinder(r=4.5,h=10.0);
translate([16.5,16.5,0.0])cylinder(r=4.5,h=10.0);
}
}
translate([-26.0,-26.0,-10.0])cube([52.0,52.0,10.0]);
}
}
